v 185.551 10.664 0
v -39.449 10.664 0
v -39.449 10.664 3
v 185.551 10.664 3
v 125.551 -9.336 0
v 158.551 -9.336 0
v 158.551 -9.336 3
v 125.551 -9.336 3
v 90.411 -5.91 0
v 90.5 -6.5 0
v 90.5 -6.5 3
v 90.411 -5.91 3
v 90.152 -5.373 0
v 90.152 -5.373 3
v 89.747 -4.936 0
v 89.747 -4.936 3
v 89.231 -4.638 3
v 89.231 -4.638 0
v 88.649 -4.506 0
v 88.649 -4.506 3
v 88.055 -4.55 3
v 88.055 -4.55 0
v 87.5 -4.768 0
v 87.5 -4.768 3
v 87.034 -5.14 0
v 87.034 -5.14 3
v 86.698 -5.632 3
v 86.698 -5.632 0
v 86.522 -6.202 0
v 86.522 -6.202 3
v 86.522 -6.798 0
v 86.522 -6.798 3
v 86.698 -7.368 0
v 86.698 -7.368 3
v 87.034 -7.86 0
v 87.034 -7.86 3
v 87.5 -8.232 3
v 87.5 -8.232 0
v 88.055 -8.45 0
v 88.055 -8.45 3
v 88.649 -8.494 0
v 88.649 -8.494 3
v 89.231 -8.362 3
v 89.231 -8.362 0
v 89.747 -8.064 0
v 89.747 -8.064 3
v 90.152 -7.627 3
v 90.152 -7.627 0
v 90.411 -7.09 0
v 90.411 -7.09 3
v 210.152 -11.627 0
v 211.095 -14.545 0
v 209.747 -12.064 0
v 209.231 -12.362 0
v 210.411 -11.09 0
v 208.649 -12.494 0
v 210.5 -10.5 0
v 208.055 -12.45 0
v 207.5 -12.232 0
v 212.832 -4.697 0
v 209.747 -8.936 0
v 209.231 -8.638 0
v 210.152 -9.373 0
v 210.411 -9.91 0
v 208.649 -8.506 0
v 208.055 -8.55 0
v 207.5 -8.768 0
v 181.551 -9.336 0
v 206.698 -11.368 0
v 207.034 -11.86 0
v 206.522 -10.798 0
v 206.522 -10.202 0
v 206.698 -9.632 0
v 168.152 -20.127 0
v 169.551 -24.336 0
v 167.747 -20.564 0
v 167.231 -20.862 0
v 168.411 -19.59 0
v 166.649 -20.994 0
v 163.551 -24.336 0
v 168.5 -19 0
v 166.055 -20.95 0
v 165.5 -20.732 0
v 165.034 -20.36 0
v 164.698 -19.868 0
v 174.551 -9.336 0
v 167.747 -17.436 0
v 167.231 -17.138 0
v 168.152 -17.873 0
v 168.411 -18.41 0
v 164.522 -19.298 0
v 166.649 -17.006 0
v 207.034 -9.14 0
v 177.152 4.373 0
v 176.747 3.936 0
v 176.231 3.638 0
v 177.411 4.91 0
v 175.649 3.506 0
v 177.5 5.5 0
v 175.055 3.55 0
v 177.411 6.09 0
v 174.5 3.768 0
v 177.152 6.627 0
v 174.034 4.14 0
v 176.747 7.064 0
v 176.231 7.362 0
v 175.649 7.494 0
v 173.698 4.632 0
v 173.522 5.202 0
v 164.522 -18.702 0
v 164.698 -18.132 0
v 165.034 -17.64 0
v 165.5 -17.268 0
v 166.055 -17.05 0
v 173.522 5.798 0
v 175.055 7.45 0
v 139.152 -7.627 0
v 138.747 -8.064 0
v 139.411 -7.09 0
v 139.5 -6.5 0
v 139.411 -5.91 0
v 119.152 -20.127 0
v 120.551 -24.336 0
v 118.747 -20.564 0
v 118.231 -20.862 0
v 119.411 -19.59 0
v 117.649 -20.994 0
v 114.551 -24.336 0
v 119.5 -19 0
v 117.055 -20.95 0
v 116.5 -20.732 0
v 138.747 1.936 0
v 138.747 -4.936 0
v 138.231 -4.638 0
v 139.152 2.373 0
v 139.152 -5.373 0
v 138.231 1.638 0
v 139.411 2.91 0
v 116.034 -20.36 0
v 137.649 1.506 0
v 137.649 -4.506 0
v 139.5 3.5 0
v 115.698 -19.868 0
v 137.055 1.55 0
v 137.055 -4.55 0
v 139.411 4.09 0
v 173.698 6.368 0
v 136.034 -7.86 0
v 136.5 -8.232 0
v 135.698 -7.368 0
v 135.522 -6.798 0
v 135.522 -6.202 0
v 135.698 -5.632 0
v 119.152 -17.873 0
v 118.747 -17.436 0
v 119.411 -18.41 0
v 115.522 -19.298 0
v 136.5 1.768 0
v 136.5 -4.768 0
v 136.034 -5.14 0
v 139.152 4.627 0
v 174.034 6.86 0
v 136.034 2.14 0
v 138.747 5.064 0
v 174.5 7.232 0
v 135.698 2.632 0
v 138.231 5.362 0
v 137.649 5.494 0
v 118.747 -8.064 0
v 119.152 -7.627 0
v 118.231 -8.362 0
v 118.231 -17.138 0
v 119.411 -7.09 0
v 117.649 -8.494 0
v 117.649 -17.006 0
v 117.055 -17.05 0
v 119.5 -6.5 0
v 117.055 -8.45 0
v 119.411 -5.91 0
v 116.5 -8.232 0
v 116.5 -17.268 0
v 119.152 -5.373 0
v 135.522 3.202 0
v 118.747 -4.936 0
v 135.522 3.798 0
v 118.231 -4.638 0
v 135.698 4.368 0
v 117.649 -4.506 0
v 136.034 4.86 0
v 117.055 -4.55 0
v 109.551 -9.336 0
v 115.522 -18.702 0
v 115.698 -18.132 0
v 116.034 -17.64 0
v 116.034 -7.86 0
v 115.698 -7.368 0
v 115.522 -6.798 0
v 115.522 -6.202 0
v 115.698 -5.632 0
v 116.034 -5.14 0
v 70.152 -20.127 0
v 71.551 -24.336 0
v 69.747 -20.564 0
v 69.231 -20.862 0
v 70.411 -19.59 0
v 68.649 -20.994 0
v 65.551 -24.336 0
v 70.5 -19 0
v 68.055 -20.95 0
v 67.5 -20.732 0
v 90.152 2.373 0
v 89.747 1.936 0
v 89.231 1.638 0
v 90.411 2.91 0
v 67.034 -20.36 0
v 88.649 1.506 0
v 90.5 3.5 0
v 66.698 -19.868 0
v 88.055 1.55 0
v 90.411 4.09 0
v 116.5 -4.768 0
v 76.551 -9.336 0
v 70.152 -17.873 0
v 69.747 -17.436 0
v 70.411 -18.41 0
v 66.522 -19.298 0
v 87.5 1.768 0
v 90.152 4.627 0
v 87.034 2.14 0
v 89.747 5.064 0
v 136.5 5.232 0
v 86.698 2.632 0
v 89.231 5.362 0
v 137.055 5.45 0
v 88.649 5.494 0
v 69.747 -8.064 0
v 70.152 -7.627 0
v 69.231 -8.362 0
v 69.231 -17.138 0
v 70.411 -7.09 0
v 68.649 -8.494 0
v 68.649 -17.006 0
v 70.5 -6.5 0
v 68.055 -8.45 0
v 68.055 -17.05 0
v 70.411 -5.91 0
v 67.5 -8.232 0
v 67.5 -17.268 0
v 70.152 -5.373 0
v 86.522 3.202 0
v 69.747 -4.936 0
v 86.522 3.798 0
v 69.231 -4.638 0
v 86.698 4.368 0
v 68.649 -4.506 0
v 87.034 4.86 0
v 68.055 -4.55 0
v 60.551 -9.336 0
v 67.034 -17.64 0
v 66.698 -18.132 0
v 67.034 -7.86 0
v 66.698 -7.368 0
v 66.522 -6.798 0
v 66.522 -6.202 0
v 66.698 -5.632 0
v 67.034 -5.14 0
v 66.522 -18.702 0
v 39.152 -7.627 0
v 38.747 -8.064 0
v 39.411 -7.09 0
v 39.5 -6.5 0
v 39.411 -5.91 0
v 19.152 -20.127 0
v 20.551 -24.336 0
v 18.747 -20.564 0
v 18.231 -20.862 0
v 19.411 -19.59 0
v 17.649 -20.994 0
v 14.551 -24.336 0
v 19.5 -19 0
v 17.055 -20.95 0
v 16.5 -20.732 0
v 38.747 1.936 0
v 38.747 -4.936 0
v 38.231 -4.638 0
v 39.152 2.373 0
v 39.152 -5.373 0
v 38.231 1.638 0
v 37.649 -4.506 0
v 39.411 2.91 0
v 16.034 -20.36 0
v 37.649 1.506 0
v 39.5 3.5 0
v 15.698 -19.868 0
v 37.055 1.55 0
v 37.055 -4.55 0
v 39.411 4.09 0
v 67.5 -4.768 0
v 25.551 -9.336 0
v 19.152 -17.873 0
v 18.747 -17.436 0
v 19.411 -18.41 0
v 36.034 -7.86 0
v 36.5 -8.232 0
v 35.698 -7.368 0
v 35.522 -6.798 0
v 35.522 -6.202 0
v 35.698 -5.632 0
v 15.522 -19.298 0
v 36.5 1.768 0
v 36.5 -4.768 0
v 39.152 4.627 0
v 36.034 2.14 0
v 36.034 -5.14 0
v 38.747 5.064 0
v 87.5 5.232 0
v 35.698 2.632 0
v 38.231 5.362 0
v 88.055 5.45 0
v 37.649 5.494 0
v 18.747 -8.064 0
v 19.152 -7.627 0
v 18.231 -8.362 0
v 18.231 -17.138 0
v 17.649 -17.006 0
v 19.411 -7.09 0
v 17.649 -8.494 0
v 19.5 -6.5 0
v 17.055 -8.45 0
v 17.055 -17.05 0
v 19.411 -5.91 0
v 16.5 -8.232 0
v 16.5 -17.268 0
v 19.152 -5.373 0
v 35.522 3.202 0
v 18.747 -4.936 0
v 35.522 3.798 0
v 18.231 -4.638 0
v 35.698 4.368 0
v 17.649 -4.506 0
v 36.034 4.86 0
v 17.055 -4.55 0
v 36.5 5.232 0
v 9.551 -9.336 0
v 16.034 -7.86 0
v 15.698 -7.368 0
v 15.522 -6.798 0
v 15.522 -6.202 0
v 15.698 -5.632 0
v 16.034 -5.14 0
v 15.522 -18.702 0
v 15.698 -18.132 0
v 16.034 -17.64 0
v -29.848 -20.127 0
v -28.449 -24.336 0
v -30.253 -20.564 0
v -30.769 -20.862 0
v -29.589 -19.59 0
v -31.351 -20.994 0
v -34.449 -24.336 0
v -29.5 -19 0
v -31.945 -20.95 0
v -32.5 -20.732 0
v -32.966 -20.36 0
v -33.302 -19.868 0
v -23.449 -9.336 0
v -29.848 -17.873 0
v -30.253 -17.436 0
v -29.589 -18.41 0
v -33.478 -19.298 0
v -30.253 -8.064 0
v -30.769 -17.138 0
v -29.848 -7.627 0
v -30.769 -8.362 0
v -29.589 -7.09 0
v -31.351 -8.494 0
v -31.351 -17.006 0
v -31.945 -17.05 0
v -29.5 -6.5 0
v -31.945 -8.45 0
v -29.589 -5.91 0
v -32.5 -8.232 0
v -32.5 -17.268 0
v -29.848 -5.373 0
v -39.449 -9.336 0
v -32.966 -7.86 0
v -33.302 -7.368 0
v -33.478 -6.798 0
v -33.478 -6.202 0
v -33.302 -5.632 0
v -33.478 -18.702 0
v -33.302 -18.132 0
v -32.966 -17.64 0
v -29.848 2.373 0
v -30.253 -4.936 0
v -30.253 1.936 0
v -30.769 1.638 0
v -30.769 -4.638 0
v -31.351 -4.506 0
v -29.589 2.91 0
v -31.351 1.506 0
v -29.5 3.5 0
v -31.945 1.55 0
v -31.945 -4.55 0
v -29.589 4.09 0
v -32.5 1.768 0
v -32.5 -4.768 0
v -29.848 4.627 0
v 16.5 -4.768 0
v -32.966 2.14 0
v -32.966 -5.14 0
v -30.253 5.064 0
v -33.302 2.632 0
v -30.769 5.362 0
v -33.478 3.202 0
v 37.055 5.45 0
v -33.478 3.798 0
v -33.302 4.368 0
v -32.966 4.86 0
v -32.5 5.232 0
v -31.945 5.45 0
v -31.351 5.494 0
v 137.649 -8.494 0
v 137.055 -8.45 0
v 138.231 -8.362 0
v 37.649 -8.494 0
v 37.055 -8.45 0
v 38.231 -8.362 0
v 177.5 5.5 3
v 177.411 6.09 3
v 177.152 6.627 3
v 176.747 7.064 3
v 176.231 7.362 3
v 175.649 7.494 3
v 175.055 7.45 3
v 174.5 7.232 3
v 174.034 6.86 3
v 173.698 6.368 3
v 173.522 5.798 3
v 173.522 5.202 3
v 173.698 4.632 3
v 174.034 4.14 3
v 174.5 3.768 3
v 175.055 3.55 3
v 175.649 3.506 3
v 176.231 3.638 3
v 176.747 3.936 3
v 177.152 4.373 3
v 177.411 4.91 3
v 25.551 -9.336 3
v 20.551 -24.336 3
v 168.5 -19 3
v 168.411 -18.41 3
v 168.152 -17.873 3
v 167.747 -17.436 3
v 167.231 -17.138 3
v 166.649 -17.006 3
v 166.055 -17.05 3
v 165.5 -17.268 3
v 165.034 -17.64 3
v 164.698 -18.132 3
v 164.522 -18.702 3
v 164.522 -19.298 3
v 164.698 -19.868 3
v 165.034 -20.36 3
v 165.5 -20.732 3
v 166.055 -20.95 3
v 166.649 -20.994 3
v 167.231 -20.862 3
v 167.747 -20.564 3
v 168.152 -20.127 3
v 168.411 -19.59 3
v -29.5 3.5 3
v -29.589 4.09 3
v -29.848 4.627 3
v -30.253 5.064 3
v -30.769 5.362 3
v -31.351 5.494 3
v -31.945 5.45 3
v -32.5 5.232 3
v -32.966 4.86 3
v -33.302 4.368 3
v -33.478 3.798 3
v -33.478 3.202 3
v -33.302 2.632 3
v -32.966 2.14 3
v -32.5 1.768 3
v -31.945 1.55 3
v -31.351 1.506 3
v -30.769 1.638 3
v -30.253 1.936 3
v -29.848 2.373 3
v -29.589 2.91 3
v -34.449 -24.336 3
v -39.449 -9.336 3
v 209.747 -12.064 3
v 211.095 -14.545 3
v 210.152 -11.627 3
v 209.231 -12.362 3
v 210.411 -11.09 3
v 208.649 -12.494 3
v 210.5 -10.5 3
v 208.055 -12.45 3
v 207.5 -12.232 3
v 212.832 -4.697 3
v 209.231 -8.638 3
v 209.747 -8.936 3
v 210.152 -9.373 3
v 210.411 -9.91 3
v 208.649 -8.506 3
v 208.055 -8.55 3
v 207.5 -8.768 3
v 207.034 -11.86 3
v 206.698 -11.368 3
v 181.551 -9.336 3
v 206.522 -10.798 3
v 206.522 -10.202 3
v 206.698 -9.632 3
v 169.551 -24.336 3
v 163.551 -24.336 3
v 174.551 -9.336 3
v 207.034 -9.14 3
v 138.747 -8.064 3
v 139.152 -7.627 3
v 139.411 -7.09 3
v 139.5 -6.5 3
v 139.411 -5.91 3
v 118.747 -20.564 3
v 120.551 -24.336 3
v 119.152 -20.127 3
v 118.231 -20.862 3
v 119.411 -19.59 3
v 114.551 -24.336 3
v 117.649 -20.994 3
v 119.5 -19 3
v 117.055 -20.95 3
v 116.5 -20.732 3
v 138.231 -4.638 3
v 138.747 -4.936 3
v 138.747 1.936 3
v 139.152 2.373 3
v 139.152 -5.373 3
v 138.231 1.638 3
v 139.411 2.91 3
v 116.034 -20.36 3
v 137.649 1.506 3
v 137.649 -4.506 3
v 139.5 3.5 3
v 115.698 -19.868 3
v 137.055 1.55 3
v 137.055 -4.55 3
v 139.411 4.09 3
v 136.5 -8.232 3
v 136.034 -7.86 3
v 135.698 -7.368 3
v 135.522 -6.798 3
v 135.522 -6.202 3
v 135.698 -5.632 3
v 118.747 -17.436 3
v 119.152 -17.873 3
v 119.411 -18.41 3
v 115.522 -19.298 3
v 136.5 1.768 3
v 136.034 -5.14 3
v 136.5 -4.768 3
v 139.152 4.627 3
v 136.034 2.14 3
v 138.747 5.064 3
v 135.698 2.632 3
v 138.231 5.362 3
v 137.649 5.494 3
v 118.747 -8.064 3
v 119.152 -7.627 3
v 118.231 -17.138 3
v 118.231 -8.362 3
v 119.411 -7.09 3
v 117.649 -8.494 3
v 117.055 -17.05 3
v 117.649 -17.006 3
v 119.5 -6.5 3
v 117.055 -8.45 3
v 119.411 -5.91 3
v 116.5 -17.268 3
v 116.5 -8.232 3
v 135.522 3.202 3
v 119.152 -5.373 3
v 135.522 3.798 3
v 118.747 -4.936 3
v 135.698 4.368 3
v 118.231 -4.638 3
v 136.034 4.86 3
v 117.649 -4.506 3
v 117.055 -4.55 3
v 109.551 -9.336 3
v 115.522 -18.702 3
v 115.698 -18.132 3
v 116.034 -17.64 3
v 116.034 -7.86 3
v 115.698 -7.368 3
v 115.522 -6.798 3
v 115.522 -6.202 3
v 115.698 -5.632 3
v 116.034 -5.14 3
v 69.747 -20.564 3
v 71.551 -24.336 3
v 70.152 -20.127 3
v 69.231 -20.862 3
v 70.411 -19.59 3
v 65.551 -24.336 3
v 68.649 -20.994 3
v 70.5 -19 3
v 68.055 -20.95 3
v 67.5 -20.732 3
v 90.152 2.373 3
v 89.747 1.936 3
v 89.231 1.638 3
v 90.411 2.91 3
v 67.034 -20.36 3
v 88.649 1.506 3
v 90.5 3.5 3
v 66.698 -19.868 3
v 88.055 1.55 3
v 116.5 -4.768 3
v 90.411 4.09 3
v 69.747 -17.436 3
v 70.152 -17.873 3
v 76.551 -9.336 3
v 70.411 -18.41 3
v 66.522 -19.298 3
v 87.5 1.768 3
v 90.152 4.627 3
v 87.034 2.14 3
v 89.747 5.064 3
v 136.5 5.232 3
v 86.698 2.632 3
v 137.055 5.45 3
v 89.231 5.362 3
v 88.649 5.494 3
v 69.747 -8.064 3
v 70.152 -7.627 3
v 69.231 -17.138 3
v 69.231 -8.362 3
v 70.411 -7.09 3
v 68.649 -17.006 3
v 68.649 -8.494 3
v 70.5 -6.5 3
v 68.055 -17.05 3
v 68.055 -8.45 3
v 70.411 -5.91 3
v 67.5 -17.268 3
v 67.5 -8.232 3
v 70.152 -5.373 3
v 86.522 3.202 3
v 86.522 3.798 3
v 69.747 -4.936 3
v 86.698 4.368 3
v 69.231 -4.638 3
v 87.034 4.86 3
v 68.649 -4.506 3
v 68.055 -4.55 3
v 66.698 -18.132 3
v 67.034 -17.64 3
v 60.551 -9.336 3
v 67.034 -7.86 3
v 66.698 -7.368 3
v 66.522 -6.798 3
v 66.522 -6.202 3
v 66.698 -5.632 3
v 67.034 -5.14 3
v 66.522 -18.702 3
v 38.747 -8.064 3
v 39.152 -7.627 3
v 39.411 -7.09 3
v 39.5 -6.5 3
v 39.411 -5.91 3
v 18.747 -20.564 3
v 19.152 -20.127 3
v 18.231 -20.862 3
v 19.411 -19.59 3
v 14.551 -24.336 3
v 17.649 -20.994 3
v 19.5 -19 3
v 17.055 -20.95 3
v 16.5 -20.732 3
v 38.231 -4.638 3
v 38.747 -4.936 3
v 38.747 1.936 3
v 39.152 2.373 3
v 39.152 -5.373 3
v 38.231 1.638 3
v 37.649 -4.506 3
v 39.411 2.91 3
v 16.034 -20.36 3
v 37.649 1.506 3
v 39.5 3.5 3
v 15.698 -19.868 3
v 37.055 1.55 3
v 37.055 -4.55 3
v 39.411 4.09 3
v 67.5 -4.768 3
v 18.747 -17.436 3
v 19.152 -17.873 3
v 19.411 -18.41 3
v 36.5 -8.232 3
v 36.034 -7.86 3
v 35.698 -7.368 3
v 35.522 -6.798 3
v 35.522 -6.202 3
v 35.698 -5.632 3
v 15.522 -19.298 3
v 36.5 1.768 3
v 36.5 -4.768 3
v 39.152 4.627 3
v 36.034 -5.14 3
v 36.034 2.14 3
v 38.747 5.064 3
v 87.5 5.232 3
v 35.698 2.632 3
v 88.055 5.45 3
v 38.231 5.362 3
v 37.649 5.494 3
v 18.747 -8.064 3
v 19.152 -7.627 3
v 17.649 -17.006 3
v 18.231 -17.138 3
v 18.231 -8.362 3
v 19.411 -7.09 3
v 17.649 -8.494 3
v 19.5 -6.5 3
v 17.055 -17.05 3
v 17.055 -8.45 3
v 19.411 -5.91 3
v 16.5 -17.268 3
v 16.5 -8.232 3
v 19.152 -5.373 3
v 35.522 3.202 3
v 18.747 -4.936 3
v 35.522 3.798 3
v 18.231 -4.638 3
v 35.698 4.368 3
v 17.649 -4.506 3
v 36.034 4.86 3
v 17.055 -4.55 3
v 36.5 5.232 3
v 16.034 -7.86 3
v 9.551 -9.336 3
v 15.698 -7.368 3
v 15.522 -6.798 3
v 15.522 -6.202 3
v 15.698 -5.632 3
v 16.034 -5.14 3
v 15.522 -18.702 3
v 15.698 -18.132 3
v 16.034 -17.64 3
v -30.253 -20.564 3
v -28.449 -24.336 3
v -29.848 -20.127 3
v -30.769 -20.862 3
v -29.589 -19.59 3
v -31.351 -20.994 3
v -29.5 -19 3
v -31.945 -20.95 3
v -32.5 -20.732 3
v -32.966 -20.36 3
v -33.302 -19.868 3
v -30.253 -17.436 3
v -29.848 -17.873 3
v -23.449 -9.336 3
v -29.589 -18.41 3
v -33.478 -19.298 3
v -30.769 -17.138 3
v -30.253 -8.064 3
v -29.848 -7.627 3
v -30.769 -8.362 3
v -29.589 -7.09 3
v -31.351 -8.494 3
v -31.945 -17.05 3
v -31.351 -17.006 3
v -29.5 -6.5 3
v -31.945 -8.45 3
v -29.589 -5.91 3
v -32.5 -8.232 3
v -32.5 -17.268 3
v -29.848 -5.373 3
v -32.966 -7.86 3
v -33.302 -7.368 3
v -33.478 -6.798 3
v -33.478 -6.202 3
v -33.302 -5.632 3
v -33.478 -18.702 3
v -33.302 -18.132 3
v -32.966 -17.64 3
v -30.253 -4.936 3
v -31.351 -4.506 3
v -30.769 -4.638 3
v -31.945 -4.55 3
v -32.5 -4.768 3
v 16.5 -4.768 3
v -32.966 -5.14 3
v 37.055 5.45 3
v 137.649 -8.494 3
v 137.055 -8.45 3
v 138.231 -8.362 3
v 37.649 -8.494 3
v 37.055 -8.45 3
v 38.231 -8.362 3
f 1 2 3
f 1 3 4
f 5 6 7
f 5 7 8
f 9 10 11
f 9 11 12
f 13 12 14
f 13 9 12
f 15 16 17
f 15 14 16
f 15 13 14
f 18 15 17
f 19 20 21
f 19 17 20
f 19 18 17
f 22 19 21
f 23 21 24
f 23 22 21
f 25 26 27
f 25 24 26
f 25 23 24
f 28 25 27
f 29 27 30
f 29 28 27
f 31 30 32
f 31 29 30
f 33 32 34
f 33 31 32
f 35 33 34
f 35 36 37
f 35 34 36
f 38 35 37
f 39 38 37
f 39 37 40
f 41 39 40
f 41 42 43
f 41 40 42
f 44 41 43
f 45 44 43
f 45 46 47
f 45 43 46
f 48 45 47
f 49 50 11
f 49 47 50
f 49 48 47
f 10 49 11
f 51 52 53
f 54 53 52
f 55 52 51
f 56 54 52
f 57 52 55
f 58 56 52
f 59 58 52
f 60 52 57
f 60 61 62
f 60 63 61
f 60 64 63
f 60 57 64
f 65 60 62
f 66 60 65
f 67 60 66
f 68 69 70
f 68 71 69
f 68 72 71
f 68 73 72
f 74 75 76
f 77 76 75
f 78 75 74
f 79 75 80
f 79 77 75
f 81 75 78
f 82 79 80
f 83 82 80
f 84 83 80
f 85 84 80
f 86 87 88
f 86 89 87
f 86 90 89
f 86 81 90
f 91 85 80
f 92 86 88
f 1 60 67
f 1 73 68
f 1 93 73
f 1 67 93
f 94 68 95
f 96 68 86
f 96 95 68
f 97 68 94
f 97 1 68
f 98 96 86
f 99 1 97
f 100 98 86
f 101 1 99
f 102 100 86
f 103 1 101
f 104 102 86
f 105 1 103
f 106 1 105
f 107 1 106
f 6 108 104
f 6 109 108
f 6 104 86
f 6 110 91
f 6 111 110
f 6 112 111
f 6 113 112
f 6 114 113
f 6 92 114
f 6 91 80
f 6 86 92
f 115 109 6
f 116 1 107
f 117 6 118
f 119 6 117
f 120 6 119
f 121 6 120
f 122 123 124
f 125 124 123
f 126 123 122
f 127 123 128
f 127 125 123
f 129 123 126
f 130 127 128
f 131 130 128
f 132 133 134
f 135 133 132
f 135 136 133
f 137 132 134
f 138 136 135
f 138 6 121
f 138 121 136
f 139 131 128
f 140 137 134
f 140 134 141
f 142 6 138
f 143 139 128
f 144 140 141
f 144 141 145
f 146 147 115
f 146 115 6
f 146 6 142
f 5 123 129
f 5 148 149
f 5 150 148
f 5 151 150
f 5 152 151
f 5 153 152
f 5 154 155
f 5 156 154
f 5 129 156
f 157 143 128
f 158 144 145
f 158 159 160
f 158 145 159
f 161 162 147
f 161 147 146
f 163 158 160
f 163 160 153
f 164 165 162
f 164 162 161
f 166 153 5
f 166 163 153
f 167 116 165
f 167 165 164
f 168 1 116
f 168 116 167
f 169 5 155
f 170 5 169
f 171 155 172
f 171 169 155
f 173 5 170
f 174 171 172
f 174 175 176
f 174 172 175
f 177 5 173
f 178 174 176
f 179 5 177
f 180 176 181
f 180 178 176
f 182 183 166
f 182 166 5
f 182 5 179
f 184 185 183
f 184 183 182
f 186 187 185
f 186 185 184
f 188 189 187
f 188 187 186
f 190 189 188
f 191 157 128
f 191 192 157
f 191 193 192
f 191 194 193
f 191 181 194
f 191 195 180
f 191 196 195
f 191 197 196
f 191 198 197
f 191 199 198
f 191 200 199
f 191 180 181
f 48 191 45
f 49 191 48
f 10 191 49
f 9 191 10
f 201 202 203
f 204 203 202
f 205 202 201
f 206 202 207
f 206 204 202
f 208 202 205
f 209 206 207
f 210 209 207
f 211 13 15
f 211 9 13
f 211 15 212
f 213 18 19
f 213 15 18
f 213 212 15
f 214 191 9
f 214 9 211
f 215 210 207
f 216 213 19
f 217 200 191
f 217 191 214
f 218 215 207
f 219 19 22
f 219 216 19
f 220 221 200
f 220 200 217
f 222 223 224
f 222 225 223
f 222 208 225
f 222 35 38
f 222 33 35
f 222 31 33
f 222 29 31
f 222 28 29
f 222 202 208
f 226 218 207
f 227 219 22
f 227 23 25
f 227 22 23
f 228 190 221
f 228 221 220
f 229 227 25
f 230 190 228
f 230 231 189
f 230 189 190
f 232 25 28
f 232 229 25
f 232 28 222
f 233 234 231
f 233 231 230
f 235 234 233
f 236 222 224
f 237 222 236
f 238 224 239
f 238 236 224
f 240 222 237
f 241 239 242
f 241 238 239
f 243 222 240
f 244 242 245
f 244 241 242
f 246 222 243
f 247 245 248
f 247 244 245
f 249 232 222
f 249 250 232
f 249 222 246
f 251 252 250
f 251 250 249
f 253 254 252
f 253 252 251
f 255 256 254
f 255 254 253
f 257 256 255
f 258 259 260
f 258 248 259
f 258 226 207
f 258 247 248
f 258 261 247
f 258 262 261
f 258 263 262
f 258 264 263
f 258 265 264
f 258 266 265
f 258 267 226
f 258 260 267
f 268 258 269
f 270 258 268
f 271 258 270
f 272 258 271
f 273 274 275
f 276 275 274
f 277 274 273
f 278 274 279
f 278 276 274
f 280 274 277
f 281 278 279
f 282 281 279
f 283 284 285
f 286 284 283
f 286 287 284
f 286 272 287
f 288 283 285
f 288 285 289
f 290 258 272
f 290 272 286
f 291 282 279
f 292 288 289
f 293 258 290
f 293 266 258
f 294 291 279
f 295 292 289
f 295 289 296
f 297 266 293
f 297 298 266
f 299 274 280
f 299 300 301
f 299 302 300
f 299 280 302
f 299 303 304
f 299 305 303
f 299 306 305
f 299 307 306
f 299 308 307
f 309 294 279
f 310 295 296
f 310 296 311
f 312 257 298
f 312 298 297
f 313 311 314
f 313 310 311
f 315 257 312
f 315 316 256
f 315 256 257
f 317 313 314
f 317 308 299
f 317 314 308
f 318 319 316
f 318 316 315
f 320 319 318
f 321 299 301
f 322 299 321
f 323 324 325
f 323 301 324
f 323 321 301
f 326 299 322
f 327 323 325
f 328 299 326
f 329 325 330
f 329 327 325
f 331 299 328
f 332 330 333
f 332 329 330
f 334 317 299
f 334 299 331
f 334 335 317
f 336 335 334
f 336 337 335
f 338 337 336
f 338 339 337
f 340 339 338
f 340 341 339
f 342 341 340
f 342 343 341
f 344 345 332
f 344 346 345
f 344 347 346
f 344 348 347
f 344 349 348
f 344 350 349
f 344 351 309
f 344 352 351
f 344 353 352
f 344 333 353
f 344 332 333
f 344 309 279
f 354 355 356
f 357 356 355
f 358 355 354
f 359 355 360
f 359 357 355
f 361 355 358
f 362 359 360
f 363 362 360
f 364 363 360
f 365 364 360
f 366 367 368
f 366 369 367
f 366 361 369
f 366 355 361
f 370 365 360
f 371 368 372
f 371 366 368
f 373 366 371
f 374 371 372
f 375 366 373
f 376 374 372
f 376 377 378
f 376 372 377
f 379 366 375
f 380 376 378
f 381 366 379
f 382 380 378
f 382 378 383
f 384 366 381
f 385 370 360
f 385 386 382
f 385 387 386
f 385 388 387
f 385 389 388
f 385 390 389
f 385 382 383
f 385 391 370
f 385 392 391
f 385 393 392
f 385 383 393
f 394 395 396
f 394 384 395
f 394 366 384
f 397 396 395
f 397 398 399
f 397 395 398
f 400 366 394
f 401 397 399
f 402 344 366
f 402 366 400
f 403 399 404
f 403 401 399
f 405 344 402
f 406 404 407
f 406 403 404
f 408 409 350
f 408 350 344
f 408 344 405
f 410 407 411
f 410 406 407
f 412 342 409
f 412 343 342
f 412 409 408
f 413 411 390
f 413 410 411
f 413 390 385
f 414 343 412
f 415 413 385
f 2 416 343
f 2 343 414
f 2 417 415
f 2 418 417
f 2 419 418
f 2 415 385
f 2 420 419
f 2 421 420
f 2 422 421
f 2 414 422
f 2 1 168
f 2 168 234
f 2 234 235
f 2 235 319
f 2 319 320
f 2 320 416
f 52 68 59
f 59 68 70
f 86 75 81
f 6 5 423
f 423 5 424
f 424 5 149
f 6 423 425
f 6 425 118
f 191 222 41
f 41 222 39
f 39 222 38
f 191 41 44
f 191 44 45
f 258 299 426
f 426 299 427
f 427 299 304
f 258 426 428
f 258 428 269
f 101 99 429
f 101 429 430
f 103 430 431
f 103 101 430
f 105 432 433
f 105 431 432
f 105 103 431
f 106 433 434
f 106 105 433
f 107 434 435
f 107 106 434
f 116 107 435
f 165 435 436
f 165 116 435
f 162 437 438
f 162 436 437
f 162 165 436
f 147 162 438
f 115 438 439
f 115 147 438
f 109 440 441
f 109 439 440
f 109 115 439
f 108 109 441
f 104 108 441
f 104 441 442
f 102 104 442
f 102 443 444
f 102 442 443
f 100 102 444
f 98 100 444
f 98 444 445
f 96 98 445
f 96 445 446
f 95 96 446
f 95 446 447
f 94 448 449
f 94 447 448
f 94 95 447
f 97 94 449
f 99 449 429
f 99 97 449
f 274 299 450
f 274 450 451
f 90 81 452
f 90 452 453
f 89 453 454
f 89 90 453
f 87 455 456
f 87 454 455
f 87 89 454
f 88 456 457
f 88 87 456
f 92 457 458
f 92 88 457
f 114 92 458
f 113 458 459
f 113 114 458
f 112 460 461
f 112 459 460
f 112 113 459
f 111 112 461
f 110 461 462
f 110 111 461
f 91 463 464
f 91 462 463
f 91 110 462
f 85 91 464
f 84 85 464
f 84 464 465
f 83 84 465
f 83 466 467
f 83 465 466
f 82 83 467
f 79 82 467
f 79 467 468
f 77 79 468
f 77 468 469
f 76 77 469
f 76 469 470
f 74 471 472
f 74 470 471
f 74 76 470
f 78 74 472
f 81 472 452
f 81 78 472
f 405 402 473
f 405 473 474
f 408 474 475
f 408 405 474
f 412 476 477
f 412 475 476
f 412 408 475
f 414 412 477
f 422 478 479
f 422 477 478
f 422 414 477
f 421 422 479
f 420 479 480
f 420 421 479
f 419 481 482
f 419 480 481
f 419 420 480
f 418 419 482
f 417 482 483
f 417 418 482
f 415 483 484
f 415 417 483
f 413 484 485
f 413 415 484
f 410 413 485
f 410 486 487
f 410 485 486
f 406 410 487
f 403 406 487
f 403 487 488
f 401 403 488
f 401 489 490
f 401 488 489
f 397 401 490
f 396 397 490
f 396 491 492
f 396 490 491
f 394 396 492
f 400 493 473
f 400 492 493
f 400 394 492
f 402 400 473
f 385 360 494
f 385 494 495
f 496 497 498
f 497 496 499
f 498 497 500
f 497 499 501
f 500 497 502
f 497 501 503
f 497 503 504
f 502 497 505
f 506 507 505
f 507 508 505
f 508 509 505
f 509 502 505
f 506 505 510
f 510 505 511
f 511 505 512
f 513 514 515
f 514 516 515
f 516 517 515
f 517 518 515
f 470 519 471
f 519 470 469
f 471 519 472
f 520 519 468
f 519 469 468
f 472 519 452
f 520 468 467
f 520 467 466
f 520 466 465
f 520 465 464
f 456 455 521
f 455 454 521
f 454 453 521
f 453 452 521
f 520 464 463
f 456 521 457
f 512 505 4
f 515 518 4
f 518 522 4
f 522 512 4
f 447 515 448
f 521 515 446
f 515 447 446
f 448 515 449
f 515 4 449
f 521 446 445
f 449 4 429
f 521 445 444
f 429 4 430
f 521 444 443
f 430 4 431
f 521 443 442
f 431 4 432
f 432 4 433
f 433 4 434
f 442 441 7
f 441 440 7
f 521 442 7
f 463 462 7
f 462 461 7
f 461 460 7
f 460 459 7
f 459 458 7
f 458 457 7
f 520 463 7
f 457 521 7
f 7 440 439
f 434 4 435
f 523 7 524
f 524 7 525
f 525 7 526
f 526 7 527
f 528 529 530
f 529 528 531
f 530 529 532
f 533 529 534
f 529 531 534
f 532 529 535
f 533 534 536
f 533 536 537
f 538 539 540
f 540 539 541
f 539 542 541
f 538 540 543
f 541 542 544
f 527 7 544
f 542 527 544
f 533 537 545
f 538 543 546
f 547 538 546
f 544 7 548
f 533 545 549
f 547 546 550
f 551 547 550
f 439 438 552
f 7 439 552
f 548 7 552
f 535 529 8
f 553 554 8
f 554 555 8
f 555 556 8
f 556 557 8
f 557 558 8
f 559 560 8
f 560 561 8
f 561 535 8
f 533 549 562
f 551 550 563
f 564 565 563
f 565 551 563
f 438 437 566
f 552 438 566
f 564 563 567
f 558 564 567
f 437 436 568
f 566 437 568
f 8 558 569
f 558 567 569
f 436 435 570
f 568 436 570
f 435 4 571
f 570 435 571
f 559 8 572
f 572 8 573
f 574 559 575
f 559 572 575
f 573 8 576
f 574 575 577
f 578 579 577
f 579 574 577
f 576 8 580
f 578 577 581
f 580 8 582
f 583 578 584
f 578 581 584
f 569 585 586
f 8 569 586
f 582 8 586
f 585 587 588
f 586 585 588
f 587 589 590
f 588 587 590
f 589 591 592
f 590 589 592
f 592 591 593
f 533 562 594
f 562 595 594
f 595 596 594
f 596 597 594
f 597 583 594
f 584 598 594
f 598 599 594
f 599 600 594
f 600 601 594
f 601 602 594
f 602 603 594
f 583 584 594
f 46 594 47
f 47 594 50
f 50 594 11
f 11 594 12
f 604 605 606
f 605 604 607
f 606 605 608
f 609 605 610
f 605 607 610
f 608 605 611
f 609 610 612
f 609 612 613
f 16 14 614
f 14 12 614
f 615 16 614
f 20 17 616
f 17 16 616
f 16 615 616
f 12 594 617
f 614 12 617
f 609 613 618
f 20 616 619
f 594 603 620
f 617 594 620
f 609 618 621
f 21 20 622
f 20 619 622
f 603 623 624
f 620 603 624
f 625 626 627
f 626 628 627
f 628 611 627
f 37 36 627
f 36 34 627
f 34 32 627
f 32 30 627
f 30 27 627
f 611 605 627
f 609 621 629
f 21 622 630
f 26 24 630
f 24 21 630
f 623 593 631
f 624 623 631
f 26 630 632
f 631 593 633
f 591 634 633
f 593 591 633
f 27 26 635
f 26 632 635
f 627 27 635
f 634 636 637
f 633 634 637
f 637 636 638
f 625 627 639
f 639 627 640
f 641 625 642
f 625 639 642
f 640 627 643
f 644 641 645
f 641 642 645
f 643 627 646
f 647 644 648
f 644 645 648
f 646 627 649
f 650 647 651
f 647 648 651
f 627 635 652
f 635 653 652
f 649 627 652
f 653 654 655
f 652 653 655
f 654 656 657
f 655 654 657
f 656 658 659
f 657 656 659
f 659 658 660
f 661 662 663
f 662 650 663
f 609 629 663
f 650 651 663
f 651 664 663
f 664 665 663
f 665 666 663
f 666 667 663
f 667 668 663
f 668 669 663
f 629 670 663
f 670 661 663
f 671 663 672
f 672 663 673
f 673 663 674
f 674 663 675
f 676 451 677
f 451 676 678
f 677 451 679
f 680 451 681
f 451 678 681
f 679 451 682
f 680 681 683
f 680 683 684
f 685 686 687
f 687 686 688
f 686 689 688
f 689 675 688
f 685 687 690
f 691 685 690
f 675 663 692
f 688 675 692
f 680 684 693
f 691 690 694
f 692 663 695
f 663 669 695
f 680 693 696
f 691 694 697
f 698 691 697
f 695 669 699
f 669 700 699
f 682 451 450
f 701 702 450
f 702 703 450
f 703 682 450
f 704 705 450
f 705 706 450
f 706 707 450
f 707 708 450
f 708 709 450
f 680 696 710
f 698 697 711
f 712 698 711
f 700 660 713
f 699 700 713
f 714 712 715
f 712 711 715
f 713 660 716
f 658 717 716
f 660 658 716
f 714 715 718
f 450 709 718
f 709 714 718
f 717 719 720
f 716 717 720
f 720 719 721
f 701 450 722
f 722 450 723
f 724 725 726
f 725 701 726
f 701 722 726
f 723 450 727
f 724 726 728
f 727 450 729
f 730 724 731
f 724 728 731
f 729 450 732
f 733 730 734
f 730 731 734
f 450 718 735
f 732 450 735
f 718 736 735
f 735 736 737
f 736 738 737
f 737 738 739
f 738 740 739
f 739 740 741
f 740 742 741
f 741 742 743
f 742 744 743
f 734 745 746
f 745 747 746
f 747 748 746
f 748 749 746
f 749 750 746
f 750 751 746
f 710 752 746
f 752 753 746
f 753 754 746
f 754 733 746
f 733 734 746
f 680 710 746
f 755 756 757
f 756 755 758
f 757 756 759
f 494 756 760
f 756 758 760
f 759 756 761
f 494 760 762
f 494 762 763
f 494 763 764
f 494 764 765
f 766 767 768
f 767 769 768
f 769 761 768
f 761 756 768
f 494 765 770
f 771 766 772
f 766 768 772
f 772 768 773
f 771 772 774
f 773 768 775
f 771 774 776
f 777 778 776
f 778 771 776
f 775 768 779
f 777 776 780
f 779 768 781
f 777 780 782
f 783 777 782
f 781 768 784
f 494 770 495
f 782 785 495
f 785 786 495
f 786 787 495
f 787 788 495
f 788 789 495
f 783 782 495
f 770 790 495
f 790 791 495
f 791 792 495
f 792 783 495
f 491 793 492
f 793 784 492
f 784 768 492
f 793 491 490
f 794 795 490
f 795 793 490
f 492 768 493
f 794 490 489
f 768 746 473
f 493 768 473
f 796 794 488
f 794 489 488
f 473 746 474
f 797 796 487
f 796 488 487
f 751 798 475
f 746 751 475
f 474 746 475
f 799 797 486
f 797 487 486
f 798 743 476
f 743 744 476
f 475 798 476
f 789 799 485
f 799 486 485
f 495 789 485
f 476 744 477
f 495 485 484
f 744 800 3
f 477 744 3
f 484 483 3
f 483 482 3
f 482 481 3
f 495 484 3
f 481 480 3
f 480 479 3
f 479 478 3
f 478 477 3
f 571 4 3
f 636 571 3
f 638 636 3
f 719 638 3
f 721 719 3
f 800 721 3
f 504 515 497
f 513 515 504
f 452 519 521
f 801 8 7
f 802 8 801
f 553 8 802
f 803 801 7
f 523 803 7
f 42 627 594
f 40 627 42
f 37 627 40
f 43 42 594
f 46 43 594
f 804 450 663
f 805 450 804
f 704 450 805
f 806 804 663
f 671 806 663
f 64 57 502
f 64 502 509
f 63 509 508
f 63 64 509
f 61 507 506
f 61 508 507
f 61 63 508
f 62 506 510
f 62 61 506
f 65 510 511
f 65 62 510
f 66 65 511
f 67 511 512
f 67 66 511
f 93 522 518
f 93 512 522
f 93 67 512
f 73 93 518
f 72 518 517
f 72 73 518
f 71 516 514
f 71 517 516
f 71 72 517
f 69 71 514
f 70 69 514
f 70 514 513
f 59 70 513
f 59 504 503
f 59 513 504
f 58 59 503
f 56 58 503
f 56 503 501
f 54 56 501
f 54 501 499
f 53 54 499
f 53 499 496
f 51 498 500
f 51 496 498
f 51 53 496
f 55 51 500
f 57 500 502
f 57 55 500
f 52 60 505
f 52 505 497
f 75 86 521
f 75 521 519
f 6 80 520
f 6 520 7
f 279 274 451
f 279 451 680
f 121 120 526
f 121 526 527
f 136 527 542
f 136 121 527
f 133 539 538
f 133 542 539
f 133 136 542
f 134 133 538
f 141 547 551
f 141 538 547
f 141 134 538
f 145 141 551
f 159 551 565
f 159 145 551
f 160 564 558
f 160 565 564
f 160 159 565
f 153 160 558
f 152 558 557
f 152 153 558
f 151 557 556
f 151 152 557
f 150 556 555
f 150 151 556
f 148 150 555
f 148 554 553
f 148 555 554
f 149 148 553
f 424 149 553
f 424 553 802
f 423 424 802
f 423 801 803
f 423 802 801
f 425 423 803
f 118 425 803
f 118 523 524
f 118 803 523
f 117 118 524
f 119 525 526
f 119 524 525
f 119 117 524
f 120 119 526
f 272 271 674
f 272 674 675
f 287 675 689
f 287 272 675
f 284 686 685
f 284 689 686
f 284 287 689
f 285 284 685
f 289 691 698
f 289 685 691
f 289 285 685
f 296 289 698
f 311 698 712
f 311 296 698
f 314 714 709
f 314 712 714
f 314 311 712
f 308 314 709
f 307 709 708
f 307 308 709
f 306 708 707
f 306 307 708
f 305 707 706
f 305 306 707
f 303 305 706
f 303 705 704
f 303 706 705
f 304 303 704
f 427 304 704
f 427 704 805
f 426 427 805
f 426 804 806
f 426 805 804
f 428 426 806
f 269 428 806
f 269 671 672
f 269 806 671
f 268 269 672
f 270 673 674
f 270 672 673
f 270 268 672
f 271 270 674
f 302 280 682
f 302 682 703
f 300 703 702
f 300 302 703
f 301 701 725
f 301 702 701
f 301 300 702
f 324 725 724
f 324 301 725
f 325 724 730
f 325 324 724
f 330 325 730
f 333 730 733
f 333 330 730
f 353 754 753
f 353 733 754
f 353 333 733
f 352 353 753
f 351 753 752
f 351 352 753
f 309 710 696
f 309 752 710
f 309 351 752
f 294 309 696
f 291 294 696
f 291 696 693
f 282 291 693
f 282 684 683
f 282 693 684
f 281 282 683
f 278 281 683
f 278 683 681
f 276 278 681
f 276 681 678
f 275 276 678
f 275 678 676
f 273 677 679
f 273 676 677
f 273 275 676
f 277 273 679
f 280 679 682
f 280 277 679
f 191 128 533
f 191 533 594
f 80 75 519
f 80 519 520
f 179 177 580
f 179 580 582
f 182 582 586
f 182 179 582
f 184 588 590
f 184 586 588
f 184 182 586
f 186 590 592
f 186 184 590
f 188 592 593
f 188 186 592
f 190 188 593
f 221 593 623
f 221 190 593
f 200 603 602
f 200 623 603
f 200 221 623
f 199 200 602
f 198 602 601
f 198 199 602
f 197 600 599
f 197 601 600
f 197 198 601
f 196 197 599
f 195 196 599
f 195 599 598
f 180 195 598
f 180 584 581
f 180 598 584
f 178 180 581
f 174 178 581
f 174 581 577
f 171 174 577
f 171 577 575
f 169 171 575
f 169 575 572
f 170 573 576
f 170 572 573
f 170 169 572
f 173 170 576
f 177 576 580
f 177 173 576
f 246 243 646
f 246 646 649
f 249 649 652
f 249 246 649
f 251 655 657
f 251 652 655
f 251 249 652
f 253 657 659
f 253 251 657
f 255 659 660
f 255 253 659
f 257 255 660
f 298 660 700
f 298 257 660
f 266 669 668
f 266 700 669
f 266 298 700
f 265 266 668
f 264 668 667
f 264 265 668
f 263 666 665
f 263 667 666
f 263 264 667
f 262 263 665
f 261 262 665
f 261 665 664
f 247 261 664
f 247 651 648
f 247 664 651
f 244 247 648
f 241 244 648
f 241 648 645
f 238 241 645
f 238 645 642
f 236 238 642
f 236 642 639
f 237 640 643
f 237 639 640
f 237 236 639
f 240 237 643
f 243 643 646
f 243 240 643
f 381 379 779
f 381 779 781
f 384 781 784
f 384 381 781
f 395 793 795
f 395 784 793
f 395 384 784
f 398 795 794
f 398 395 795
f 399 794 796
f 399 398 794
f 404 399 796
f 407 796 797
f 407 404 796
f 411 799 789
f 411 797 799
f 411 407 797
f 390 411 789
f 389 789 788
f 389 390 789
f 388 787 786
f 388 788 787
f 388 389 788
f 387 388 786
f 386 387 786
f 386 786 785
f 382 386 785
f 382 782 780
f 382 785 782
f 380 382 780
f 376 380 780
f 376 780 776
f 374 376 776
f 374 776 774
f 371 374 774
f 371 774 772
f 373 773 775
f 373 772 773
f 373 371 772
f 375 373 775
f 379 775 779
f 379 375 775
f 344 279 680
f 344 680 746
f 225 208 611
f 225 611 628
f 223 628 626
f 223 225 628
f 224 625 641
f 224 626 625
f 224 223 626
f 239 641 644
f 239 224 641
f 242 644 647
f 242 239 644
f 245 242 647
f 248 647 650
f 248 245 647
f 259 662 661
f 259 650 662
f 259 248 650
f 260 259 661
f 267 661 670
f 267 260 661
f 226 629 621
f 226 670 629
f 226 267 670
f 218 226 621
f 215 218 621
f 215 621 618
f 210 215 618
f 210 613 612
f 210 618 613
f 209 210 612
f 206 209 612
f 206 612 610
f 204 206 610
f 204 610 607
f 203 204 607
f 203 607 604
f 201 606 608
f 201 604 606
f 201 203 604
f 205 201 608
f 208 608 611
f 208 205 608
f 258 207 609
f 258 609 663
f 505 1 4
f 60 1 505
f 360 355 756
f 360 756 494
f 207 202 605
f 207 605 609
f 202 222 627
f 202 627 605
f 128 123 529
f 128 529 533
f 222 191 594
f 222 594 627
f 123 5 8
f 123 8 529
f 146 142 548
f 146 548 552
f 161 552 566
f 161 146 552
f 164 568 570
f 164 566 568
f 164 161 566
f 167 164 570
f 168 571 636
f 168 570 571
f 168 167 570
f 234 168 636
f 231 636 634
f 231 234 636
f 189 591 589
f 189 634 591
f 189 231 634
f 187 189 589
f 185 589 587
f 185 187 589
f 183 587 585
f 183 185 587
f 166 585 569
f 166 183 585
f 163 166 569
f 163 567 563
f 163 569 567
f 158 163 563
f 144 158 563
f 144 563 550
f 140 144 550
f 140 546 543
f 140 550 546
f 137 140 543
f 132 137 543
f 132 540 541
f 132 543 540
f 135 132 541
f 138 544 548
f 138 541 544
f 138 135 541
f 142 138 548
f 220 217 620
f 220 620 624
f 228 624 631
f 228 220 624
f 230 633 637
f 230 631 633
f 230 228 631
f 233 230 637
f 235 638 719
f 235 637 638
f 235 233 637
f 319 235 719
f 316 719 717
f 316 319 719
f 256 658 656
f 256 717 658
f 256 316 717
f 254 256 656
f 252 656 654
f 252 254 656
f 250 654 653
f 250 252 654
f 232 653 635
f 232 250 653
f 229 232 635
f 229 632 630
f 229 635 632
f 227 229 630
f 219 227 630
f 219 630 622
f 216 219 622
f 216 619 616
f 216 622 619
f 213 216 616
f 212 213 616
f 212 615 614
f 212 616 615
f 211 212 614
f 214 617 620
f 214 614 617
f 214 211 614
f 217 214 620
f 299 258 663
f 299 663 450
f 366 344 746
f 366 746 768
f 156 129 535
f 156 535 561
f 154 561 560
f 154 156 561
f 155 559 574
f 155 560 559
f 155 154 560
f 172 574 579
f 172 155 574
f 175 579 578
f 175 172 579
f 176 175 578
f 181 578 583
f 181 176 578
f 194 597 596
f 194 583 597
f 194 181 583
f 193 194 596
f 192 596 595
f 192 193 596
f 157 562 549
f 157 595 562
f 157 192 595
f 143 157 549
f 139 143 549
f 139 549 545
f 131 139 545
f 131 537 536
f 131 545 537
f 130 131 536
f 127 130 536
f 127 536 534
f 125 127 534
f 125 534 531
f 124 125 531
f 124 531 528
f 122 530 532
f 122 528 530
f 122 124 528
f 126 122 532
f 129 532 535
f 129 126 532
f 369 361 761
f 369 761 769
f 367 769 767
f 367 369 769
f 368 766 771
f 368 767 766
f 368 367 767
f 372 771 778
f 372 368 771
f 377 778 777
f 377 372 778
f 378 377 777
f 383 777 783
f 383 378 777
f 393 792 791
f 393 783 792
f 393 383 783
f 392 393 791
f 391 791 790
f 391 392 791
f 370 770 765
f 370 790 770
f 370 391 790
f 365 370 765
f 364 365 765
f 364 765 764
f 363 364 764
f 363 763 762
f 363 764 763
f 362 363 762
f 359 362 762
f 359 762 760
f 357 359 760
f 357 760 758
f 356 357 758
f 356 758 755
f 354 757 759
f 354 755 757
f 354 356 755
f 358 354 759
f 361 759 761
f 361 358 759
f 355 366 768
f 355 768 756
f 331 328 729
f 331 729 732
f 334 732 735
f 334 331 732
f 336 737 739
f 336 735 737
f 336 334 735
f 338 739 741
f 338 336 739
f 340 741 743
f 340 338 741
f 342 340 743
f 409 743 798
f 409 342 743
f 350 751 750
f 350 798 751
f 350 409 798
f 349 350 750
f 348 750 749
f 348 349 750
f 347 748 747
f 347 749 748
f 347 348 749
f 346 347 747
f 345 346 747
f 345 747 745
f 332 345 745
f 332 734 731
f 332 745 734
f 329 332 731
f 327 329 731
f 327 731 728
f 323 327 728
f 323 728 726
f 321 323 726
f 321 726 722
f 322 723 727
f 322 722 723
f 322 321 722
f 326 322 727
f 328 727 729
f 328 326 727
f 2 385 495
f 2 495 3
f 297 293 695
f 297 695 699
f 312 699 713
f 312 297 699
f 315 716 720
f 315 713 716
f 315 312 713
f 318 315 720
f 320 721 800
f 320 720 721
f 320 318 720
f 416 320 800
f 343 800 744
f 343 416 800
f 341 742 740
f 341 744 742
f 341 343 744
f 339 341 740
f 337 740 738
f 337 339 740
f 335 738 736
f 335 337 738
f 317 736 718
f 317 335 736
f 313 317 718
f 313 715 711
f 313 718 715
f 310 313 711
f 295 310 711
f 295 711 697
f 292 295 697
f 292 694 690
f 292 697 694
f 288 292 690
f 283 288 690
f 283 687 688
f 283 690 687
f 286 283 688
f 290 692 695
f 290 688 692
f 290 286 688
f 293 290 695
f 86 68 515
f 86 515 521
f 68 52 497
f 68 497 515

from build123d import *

# Parameters (mm, degrees)
CYLINDER012_R     = 2
CYLINDER012_DEPTH = 10
CYLINDER013_R     = 2
CYLINDER013_DEPTH = 10
CYLINDER014_R     = 2
CYLINDER014_DEPTH = 10
CYLINDER015_R     = 2
CYLINDER015_DEPTH = 10
CYLINDER016_R     = 2
CYLINDER016_DEPTH = 10
CYLINDER017_R     = 2
CYLINDER017_DEPTH = 10
CYLINDER018_R     = 2
CYLINDER018_DEPTH = 10
CYLINDER011_R     = 2
CYLINDER011_DEPTH = 10
CYLINDER007_R     = 2
CYLINDER007_DEPTH = 10
CYLINDER008_R     = 2
CYLINDER008_DEPTH = 10
CYLINDER009_R     = 2
CYLINDER009_DEPTH = 10
CYLINDER010_R     = 2
CYLINDER010_DEPTH = 10
CYLINDER006_R     = 2
CYLINDER006_DEPTH = 10
CYLINDER001_R     = 2
CYLINDER001_DEPTH = 10
CYLINDER005_R     = 2
CYLINDER005_DEPTH = 10
CYLINDER004_R     = 2
CYLINDER004_DEPTH = 10
CYLINDER003_R     = 2
CYLINDER003_DEPTH = 10
CYLINDER002_R     = 2
CYLINDER002_DEPTH = 10
CYLINDER_R        = 2
CYLINDER_DEPTH    = 10
PAD_DEPTH         = 3


with BuildPart() as cylinder012:
    # Cylinder012 → Cylinder012 (new body)
    with BuildSketch(Plane(origin=(37.5, -6.5, -5), x_dir=(1, 0, 0), z_dir=(0, 0, 1))):
        Circle(CYLINDER012_R)
    extrude(amount=CYLINDER012_DEPTH)


with BuildPart() as cylinder013:
    # Cylinder013 → Cylinder013 (new body)
    with BuildSketch(Plane(origin=(88.5, 3.5, -5), x_dir=(1, 0, 0), z_dir=(0, 0, 1))):
        Circle(CYLINDER013_R)
    extrude(amount=CYLINDER013_DEPTH)


with BuildPart() as cylinder014:
    # Cylinder014 → Cylinder014 (new body)
    with BuildSketch(Plane(origin=(88.5, -6.5, -5), x_dir=(1, 0, 0), z_dir=(0, 0, 1))):
        Circle(CYLINDER014_R)
    extrude(amount=CYLINDER014_DEPTH)


with BuildPart() as cylinder015:
    # Cylinder015 → Cylinder015 (new body)
    with BuildSketch(Plane(origin=(137.5, -6.5, -5), x_dir=(1, 0, 0), z_dir=(0, 0, 1))):
        Circle(CYLINDER015_R)
    extrude(amount=CYLINDER015_DEPTH)


with BuildPart() as cylinder016:
    # Cylinder016 → Cylinder016 (new body)
    with BuildSketch(Plane(origin=(137.5, 3.5, -5), x_dir=(1, 0, 0), z_dir=(0, 0, 1))):
        Circle(CYLINDER016_R)
    extrude(amount=CYLINDER016_DEPTH)


with BuildPart() as cylinder017:
    # Cylinder017 → Cylinder017 (new body)
    with BuildSketch(Plane(origin=(37.5, 3.5, -5), x_dir=(1, 0, 0), z_dir=(0, 0, 1))):
        Circle(CYLINDER017_R)
    extrude(amount=CYLINDER017_DEPTH)


with BuildPart() as cylinder018:
    # Cylinder018 → Cylinder018 (new body)
    with BuildSketch(Plane(origin=(117.5, -6.5, -5), x_dir=(1, 0, 0), z_dir=(0, 0, 1))):
        Circle(CYLINDER018_R)
    extrude(amount=CYLINDER018_DEPTH)


with BuildPart() as cylinder011:
    # Cylinder011 → Cylinder011 (new body)
    with BuildSketch(Plane(origin=(-31.5, 3.5, -5), x_dir=(1, 0, 0), z_dir=(0, 0, 1))):
        Circle(CYLINDER011_R)
    extrude(amount=CYLINDER011_DEPTH)


with BuildPart() as cylinder007:
    # Cylinder007 → Cylinder007 (new body)
    with BuildSketch(Plane(origin=(117.5, -6.5, -3), x_dir=(1, 0, 0), z_dir=(0, 0, 1))):
        Circle(CYLINDER007_R)
    extrude(amount=CYLINDER007_DEPTH)


with BuildPart() as cylinder008:
    # Cylinder008 → Cylinder008 (new body)
    with BuildSketch(Plane(origin=(68.5, -6.5, -3), x_dir=(1, 0, 0), z_dir=(0, 0, 1))):
        Circle(CYLINDER008_R)
    extrude(amount=CYLINDER008_DEPTH)


with BuildPart() as cylinder009:
    # Cylinder009 → Cylinder009 (new body)
    with BuildSketch(Plane(origin=(17.5, -6.5, -3), x_dir=(1, 0, 0), z_dir=(0, 0, 1))):
        Circle(CYLINDER009_R)
    extrude(amount=CYLINDER009_DEPTH)


with BuildPart() as cylinder010:
    # Cylinder010 → Cylinder010 (new body)
    with BuildSketch(Plane(origin=(-31.5, -6.5, -3), x_dir=(1, 0, 0), z_dir=(0, 0, 1))):
        Circle(CYLINDER010_R)
    extrude(amount=CYLINDER010_DEPTH)


with BuildPart() as cylinder006:
    # Cylinder006 → Cylinder006 (new body)
    with BuildSketch(Plane(origin=(175.5, 5.5, -3), x_dir=(1, 0, 0), z_dir=(0, 0, 1))):
        Circle(CYLINDER006_R)
    extrude(amount=CYLINDER006_DEPTH)


with BuildPart() as cylinder001:
    # Cylinder001 → Cylinder001 (new body)
    with BuildSketch(Plane(origin=(166.5, -19, -3), x_dir=(1, 0, 0), z_dir=(0, 0, 1))):
        Circle(CYLINDER001_R)
    extrude(amount=CYLINDER001_DEPTH)


with BuildPart() as cylinder005:
    # Cylinder005 → Cylinder005 (new body)
    with BuildSketch(Plane(origin=(208.5, -10.5, -3), x_dir=(1, 0, 0), z_dir=(0, 0, 1))):
        Circle(CYLINDER005_R)
    extrude(amount=CYLINDER005_DEPTH)


with BuildPart() as cylinder004:
    # Cylinder004 → Cylinder004 (new body)
    with BuildSketch(Plane(origin=(-31.5, -19, -3), x_dir=(1, 0, 0), z_dir=(0, 0, 1))):
        Circle(CYLINDER004_R)
    extrude(amount=CYLINDER004_DEPTH)


with BuildPart() as cylinder003:
    # Cylinder003 → Cylinder003 (new body)
    with BuildSketch(Plane(origin=(68.5, -19, -3), x_dir=(1, 0, 0), z_dir=(0, 0, 1))):
        Circle(CYLINDER003_R)
    extrude(amount=CYLINDER003_DEPTH)


with BuildPart() as cylinder002:
    # Cylinder002 → Cylinder002 (new body)
    with BuildSketch(Plane(origin=(117.5, -19, -3), x_dir=(1, 0, 0), z_dir=(0, 0, 1))):
        Circle(CYLINDER002_R)
    extrude(amount=CYLINDER002_DEPTH)


with BuildPart() as cylinder:
    # Cylinder → Cylinder (new body)
    with BuildSketch(Plane(origin=(17.5, -19, -3), x_dir=(1, 0, 0), z_dir=(0, 0, 1))):
        Circle(CYLINDER_R)
    extrude(amount=CYLINDER_DEPTH)


with BuildPart() as cut018:
    # Sketch001 → Pad (new body)
    with BuildSketch(Plane.XY):
        Polygon((-43.448801, 7.664407), (181.551199, 7.664407), (208.831914, -7.696961), (207.095432, -17.545038), (177.551199, -12.335593), (170.551199, -12.335593), (165.551199, -27.335593), (159.551199, -27.335593), (154.551199, -12.335593), (121.551199, -12.335593), (116.551199, -27.335593), (110.551199, -27.335593), (105.551199, -12.335593), (72.551199, -12.335593), (67.551199, -27.335593), (61.551199, -27.335593), (56.551199, -12.335593), (21.551199, -12.335593), (16.551199, -27.335593), (10.551199, -27.335593), (5.551199, -12.335593), (-27.448801, -12.335593), (-32.448801, -27.335593), (-38.448801, -27.335593), (-43.448801, -12.335593), align=None)
    extrude(amount=PAD_DEPTH)


with BuildPart() as cut018_1:
    # Body001 placement: moved
    add(cut018.part.moved(Location((4, 3, 0))))

    # Cut: cut Cylinder
    add(cylinder.part, mode=Mode.SUBTRACT)

    # Cut001: cut Cylinder002
    add(cylinder002.part, mode=Mode.SUBTRACT)

    # Cut002: cut Cylinder003
    add(cylinder003.part, mode=Mode.SUBTRACT)

    # Cut003: cut Cylinder004
    add(cylinder004.part, mode=Mode.SUBTRACT)

    # Cut004: cut Cylinder005
    add(cylinder005.part, mode=Mode.SUBTRACT)

    # Cut005: cut Cylinder001
    add(cylinder001.part, mode=Mode.SUBTRACT)

    # Cut006: cut Cylinder006
    add(cylinder006.part, mode=Mode.SUBTRACT)

    # Cut007: cut Cylinder010
    add(cylinder010.part, mode=Mode.SUBTRACT)

    # Cut008: cut Cylinder009
    add(cylinder009.part, mode=Mode.SUBTRACT)

    # Cut009: cut Cylinder008
    add(cylinder008.part, mode=Mode.SUBTRACT)

    # Cut010: cut Cylinder007
    add(cylinder007.part, mode=Mode.SUBTRACT)

    # Cut011: cut Cylinder011
    add(cylinder011.part, mode=Mode.SUBTRACT)

    # Cut012: cut Cylinder018
    add(cylinder018.part, mode=Mode.SUBTRACT)

    # Cut013: cut Cylinder017
    add(cylinder017.part, mode=Mode.SUBTRACT)

    # Cut014: cut Cylinder016
    add(cylinder016.part, mode=Mode.SUBTRACT)

    # Cut015: cut Cylinder015
    add(cylinder015.part, mode=Mode.SUBTRACT)

    # Cut016: cut Cylinder014
    add(cylinder014.part, mode=Mode.SUBTRACT)

    # Cut017: cut Cylinder013
    add(cylinder013.part, mode=Mode.SUBTRACT)

    # Cut018: cut Cylinder012
    add(cylinder012.part, mode=Mode.SUBTRACT)


solid = cut018_1.part
